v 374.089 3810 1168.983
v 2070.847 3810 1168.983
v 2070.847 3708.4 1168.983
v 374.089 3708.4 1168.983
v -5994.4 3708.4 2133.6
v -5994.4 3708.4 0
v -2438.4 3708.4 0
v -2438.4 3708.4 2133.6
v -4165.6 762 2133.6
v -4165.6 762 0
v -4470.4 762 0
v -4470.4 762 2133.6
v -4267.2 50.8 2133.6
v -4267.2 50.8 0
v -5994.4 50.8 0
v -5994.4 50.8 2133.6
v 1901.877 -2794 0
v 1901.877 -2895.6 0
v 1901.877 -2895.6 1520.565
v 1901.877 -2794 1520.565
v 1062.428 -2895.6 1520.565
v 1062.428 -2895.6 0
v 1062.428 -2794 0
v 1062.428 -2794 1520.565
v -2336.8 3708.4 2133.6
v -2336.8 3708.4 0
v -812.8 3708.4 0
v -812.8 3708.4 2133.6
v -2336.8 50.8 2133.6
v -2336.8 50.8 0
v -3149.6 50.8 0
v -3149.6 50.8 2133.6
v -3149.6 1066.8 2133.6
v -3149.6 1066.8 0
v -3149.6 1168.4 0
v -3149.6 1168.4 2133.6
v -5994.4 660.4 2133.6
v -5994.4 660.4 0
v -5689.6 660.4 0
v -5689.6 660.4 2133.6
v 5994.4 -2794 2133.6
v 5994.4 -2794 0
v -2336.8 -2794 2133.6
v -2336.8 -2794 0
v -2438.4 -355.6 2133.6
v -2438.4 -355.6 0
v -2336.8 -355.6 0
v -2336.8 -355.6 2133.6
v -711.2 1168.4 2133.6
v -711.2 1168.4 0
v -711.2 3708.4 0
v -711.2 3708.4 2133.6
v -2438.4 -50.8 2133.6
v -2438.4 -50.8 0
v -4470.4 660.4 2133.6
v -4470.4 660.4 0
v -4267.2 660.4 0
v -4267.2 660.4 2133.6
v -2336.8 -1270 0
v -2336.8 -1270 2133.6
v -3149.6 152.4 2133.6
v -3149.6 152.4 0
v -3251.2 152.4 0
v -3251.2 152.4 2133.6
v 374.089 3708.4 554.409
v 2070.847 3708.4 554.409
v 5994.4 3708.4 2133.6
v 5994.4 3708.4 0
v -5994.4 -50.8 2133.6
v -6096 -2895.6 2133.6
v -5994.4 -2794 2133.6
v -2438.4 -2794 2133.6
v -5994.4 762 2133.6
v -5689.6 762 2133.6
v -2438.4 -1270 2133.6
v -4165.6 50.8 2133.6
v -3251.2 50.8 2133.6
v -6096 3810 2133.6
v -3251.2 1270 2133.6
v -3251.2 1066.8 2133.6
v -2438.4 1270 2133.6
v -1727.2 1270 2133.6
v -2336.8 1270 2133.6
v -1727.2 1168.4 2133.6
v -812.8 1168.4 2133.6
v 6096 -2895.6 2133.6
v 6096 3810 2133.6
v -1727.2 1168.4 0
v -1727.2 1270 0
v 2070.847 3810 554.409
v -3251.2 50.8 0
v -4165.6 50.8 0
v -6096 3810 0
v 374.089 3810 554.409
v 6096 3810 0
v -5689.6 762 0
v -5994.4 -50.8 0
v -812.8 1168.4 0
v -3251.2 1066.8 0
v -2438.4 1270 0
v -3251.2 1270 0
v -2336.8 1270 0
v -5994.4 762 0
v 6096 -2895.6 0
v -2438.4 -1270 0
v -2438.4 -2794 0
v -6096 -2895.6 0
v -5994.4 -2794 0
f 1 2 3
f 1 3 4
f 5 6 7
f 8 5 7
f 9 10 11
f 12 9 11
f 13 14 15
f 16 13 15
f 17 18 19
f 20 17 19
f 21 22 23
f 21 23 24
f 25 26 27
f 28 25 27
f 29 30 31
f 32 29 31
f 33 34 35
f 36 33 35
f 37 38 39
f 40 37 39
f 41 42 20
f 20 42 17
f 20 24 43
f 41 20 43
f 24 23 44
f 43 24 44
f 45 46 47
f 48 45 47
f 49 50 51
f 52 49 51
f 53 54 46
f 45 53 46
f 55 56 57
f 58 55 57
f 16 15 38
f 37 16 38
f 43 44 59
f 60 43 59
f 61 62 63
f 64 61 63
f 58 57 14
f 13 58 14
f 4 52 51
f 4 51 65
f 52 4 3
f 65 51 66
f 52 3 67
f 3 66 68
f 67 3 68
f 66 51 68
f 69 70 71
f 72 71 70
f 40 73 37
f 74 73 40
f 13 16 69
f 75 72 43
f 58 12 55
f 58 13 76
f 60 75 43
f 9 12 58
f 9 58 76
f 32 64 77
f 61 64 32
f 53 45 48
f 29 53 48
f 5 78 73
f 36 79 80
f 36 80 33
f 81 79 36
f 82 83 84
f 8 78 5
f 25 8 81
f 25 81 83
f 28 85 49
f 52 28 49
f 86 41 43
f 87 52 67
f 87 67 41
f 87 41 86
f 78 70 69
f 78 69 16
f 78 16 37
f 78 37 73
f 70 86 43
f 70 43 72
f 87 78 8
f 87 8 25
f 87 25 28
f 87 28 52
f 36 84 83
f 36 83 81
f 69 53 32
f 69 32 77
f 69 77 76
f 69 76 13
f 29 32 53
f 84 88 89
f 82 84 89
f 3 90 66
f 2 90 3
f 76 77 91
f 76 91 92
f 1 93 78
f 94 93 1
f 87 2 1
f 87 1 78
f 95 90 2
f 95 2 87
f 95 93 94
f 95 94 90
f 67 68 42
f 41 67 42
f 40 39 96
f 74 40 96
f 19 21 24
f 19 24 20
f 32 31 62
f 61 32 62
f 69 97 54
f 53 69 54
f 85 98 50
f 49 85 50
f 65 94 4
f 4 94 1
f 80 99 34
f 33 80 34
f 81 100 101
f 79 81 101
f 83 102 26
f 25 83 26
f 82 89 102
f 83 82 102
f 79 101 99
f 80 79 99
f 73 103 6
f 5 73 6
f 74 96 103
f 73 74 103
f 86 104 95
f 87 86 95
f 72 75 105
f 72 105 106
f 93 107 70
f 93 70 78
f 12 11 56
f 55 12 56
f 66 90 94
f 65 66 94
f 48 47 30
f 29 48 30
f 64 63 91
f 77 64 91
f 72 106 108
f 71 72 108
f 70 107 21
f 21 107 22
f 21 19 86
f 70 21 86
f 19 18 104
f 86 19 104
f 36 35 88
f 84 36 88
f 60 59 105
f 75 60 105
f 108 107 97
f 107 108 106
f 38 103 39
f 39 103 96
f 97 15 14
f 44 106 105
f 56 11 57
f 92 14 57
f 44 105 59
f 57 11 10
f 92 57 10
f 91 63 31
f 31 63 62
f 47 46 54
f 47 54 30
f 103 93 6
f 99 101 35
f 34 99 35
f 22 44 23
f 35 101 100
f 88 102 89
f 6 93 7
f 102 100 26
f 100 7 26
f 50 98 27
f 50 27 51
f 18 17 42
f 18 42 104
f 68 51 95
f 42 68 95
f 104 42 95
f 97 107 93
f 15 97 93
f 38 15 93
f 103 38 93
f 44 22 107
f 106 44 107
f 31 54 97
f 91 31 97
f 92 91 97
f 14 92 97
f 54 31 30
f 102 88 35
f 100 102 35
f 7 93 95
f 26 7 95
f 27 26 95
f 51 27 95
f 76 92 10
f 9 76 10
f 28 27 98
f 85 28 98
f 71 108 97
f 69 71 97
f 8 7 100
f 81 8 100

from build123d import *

# Parameters (mm, degrees)
F0_W     = 12192
F0_H     = 6705.6
F1_DEPTH = 2133.6
F2_W     = 839.4492864609
F2_H     = 1520.5647945404
F3_DEPTH = 101.6
F4_W     = 1696.7584192753
F4_H     = 614.5740151405
F5_DEPTH = 101.6


with BuildPart() as f1:
    # F0 (on Top) → F1 (new body)
    with BuildSketch(Plane.XY):
        with Locations((0, 457.2)):
            Rectangle(F0_W, F0_H)
        Polygon((-5994.4, 762), (-5994.4, 3708.4), (-2438.4, 3708.4), (-2438.4, 1270), (-3251.2, 1270), (-3251.2, 1066.8), (-3149.6, 1066.8), (-3149.6, 1168.4), (-2336.8, 1168.4), (-1727.2, 1168.4), (-1727.2, 1270), (-2336.8, 1270), (-2336.8, 3708.4), (-812.8, 3708.4), (-812.8, 1168.4), (-711.2, 1168.4), (-711.2, 3708.4), (5994.4, 3708.4), (5994.4, -2794), (-2336.8, -2794), (-2336.8, -1270), (-2438.4, -1270), (-2438.4, -2794), (-5994.4, -2794), (-5994.4, -50.8), (-2438.4, -50.8), (-2438.4, -355.6), (-2336.8, -355.6), (-2336.8, 50.8), (-3149.6, 50.8), (-3149.6, 152.4), (-3251.2, 152.4), (-3251.2, 50.8), (-4165.6, 50.8), (-4165.6, 762), (-4470.4, 762), (-4470.4, 660.4), (-4267.2, 660.4), (-4267.2, 50.8), (-5994.4, 50.8), (-5994.4, 660.4), (-5689.6, 660.4), (-5689.6, 762), align=None, mode=Mode.SUBTRACT)
    extrude(amount=F1_DEPTH)

    # F2 (on face) → F3 (cut, through all)
    with BuildSketch(Plane.XZ.offset(2895.6)):
        with Locations((1482.1525216103, 760.2823972702)):
            Rectangle(F2_W, F2_H)
    extrude(amount=-F3_DEPTH, mode=Mode.SUBTRACT)

    # F4 (on face) → F5 (cut, through all)
    with BuildSketch(Plane(origin=(0, 3810, 0), x_dir=(-1, 0, 0), z_dir=(0, 1, 0))):
        with Locations((-1222.4678248167, 861.6962134838)):
            Rectangle(F4_W, F4_H)
    extrude(amount=-F5_DEPTH, mode=Mode.SUBTRACT)


solid = f1.part
